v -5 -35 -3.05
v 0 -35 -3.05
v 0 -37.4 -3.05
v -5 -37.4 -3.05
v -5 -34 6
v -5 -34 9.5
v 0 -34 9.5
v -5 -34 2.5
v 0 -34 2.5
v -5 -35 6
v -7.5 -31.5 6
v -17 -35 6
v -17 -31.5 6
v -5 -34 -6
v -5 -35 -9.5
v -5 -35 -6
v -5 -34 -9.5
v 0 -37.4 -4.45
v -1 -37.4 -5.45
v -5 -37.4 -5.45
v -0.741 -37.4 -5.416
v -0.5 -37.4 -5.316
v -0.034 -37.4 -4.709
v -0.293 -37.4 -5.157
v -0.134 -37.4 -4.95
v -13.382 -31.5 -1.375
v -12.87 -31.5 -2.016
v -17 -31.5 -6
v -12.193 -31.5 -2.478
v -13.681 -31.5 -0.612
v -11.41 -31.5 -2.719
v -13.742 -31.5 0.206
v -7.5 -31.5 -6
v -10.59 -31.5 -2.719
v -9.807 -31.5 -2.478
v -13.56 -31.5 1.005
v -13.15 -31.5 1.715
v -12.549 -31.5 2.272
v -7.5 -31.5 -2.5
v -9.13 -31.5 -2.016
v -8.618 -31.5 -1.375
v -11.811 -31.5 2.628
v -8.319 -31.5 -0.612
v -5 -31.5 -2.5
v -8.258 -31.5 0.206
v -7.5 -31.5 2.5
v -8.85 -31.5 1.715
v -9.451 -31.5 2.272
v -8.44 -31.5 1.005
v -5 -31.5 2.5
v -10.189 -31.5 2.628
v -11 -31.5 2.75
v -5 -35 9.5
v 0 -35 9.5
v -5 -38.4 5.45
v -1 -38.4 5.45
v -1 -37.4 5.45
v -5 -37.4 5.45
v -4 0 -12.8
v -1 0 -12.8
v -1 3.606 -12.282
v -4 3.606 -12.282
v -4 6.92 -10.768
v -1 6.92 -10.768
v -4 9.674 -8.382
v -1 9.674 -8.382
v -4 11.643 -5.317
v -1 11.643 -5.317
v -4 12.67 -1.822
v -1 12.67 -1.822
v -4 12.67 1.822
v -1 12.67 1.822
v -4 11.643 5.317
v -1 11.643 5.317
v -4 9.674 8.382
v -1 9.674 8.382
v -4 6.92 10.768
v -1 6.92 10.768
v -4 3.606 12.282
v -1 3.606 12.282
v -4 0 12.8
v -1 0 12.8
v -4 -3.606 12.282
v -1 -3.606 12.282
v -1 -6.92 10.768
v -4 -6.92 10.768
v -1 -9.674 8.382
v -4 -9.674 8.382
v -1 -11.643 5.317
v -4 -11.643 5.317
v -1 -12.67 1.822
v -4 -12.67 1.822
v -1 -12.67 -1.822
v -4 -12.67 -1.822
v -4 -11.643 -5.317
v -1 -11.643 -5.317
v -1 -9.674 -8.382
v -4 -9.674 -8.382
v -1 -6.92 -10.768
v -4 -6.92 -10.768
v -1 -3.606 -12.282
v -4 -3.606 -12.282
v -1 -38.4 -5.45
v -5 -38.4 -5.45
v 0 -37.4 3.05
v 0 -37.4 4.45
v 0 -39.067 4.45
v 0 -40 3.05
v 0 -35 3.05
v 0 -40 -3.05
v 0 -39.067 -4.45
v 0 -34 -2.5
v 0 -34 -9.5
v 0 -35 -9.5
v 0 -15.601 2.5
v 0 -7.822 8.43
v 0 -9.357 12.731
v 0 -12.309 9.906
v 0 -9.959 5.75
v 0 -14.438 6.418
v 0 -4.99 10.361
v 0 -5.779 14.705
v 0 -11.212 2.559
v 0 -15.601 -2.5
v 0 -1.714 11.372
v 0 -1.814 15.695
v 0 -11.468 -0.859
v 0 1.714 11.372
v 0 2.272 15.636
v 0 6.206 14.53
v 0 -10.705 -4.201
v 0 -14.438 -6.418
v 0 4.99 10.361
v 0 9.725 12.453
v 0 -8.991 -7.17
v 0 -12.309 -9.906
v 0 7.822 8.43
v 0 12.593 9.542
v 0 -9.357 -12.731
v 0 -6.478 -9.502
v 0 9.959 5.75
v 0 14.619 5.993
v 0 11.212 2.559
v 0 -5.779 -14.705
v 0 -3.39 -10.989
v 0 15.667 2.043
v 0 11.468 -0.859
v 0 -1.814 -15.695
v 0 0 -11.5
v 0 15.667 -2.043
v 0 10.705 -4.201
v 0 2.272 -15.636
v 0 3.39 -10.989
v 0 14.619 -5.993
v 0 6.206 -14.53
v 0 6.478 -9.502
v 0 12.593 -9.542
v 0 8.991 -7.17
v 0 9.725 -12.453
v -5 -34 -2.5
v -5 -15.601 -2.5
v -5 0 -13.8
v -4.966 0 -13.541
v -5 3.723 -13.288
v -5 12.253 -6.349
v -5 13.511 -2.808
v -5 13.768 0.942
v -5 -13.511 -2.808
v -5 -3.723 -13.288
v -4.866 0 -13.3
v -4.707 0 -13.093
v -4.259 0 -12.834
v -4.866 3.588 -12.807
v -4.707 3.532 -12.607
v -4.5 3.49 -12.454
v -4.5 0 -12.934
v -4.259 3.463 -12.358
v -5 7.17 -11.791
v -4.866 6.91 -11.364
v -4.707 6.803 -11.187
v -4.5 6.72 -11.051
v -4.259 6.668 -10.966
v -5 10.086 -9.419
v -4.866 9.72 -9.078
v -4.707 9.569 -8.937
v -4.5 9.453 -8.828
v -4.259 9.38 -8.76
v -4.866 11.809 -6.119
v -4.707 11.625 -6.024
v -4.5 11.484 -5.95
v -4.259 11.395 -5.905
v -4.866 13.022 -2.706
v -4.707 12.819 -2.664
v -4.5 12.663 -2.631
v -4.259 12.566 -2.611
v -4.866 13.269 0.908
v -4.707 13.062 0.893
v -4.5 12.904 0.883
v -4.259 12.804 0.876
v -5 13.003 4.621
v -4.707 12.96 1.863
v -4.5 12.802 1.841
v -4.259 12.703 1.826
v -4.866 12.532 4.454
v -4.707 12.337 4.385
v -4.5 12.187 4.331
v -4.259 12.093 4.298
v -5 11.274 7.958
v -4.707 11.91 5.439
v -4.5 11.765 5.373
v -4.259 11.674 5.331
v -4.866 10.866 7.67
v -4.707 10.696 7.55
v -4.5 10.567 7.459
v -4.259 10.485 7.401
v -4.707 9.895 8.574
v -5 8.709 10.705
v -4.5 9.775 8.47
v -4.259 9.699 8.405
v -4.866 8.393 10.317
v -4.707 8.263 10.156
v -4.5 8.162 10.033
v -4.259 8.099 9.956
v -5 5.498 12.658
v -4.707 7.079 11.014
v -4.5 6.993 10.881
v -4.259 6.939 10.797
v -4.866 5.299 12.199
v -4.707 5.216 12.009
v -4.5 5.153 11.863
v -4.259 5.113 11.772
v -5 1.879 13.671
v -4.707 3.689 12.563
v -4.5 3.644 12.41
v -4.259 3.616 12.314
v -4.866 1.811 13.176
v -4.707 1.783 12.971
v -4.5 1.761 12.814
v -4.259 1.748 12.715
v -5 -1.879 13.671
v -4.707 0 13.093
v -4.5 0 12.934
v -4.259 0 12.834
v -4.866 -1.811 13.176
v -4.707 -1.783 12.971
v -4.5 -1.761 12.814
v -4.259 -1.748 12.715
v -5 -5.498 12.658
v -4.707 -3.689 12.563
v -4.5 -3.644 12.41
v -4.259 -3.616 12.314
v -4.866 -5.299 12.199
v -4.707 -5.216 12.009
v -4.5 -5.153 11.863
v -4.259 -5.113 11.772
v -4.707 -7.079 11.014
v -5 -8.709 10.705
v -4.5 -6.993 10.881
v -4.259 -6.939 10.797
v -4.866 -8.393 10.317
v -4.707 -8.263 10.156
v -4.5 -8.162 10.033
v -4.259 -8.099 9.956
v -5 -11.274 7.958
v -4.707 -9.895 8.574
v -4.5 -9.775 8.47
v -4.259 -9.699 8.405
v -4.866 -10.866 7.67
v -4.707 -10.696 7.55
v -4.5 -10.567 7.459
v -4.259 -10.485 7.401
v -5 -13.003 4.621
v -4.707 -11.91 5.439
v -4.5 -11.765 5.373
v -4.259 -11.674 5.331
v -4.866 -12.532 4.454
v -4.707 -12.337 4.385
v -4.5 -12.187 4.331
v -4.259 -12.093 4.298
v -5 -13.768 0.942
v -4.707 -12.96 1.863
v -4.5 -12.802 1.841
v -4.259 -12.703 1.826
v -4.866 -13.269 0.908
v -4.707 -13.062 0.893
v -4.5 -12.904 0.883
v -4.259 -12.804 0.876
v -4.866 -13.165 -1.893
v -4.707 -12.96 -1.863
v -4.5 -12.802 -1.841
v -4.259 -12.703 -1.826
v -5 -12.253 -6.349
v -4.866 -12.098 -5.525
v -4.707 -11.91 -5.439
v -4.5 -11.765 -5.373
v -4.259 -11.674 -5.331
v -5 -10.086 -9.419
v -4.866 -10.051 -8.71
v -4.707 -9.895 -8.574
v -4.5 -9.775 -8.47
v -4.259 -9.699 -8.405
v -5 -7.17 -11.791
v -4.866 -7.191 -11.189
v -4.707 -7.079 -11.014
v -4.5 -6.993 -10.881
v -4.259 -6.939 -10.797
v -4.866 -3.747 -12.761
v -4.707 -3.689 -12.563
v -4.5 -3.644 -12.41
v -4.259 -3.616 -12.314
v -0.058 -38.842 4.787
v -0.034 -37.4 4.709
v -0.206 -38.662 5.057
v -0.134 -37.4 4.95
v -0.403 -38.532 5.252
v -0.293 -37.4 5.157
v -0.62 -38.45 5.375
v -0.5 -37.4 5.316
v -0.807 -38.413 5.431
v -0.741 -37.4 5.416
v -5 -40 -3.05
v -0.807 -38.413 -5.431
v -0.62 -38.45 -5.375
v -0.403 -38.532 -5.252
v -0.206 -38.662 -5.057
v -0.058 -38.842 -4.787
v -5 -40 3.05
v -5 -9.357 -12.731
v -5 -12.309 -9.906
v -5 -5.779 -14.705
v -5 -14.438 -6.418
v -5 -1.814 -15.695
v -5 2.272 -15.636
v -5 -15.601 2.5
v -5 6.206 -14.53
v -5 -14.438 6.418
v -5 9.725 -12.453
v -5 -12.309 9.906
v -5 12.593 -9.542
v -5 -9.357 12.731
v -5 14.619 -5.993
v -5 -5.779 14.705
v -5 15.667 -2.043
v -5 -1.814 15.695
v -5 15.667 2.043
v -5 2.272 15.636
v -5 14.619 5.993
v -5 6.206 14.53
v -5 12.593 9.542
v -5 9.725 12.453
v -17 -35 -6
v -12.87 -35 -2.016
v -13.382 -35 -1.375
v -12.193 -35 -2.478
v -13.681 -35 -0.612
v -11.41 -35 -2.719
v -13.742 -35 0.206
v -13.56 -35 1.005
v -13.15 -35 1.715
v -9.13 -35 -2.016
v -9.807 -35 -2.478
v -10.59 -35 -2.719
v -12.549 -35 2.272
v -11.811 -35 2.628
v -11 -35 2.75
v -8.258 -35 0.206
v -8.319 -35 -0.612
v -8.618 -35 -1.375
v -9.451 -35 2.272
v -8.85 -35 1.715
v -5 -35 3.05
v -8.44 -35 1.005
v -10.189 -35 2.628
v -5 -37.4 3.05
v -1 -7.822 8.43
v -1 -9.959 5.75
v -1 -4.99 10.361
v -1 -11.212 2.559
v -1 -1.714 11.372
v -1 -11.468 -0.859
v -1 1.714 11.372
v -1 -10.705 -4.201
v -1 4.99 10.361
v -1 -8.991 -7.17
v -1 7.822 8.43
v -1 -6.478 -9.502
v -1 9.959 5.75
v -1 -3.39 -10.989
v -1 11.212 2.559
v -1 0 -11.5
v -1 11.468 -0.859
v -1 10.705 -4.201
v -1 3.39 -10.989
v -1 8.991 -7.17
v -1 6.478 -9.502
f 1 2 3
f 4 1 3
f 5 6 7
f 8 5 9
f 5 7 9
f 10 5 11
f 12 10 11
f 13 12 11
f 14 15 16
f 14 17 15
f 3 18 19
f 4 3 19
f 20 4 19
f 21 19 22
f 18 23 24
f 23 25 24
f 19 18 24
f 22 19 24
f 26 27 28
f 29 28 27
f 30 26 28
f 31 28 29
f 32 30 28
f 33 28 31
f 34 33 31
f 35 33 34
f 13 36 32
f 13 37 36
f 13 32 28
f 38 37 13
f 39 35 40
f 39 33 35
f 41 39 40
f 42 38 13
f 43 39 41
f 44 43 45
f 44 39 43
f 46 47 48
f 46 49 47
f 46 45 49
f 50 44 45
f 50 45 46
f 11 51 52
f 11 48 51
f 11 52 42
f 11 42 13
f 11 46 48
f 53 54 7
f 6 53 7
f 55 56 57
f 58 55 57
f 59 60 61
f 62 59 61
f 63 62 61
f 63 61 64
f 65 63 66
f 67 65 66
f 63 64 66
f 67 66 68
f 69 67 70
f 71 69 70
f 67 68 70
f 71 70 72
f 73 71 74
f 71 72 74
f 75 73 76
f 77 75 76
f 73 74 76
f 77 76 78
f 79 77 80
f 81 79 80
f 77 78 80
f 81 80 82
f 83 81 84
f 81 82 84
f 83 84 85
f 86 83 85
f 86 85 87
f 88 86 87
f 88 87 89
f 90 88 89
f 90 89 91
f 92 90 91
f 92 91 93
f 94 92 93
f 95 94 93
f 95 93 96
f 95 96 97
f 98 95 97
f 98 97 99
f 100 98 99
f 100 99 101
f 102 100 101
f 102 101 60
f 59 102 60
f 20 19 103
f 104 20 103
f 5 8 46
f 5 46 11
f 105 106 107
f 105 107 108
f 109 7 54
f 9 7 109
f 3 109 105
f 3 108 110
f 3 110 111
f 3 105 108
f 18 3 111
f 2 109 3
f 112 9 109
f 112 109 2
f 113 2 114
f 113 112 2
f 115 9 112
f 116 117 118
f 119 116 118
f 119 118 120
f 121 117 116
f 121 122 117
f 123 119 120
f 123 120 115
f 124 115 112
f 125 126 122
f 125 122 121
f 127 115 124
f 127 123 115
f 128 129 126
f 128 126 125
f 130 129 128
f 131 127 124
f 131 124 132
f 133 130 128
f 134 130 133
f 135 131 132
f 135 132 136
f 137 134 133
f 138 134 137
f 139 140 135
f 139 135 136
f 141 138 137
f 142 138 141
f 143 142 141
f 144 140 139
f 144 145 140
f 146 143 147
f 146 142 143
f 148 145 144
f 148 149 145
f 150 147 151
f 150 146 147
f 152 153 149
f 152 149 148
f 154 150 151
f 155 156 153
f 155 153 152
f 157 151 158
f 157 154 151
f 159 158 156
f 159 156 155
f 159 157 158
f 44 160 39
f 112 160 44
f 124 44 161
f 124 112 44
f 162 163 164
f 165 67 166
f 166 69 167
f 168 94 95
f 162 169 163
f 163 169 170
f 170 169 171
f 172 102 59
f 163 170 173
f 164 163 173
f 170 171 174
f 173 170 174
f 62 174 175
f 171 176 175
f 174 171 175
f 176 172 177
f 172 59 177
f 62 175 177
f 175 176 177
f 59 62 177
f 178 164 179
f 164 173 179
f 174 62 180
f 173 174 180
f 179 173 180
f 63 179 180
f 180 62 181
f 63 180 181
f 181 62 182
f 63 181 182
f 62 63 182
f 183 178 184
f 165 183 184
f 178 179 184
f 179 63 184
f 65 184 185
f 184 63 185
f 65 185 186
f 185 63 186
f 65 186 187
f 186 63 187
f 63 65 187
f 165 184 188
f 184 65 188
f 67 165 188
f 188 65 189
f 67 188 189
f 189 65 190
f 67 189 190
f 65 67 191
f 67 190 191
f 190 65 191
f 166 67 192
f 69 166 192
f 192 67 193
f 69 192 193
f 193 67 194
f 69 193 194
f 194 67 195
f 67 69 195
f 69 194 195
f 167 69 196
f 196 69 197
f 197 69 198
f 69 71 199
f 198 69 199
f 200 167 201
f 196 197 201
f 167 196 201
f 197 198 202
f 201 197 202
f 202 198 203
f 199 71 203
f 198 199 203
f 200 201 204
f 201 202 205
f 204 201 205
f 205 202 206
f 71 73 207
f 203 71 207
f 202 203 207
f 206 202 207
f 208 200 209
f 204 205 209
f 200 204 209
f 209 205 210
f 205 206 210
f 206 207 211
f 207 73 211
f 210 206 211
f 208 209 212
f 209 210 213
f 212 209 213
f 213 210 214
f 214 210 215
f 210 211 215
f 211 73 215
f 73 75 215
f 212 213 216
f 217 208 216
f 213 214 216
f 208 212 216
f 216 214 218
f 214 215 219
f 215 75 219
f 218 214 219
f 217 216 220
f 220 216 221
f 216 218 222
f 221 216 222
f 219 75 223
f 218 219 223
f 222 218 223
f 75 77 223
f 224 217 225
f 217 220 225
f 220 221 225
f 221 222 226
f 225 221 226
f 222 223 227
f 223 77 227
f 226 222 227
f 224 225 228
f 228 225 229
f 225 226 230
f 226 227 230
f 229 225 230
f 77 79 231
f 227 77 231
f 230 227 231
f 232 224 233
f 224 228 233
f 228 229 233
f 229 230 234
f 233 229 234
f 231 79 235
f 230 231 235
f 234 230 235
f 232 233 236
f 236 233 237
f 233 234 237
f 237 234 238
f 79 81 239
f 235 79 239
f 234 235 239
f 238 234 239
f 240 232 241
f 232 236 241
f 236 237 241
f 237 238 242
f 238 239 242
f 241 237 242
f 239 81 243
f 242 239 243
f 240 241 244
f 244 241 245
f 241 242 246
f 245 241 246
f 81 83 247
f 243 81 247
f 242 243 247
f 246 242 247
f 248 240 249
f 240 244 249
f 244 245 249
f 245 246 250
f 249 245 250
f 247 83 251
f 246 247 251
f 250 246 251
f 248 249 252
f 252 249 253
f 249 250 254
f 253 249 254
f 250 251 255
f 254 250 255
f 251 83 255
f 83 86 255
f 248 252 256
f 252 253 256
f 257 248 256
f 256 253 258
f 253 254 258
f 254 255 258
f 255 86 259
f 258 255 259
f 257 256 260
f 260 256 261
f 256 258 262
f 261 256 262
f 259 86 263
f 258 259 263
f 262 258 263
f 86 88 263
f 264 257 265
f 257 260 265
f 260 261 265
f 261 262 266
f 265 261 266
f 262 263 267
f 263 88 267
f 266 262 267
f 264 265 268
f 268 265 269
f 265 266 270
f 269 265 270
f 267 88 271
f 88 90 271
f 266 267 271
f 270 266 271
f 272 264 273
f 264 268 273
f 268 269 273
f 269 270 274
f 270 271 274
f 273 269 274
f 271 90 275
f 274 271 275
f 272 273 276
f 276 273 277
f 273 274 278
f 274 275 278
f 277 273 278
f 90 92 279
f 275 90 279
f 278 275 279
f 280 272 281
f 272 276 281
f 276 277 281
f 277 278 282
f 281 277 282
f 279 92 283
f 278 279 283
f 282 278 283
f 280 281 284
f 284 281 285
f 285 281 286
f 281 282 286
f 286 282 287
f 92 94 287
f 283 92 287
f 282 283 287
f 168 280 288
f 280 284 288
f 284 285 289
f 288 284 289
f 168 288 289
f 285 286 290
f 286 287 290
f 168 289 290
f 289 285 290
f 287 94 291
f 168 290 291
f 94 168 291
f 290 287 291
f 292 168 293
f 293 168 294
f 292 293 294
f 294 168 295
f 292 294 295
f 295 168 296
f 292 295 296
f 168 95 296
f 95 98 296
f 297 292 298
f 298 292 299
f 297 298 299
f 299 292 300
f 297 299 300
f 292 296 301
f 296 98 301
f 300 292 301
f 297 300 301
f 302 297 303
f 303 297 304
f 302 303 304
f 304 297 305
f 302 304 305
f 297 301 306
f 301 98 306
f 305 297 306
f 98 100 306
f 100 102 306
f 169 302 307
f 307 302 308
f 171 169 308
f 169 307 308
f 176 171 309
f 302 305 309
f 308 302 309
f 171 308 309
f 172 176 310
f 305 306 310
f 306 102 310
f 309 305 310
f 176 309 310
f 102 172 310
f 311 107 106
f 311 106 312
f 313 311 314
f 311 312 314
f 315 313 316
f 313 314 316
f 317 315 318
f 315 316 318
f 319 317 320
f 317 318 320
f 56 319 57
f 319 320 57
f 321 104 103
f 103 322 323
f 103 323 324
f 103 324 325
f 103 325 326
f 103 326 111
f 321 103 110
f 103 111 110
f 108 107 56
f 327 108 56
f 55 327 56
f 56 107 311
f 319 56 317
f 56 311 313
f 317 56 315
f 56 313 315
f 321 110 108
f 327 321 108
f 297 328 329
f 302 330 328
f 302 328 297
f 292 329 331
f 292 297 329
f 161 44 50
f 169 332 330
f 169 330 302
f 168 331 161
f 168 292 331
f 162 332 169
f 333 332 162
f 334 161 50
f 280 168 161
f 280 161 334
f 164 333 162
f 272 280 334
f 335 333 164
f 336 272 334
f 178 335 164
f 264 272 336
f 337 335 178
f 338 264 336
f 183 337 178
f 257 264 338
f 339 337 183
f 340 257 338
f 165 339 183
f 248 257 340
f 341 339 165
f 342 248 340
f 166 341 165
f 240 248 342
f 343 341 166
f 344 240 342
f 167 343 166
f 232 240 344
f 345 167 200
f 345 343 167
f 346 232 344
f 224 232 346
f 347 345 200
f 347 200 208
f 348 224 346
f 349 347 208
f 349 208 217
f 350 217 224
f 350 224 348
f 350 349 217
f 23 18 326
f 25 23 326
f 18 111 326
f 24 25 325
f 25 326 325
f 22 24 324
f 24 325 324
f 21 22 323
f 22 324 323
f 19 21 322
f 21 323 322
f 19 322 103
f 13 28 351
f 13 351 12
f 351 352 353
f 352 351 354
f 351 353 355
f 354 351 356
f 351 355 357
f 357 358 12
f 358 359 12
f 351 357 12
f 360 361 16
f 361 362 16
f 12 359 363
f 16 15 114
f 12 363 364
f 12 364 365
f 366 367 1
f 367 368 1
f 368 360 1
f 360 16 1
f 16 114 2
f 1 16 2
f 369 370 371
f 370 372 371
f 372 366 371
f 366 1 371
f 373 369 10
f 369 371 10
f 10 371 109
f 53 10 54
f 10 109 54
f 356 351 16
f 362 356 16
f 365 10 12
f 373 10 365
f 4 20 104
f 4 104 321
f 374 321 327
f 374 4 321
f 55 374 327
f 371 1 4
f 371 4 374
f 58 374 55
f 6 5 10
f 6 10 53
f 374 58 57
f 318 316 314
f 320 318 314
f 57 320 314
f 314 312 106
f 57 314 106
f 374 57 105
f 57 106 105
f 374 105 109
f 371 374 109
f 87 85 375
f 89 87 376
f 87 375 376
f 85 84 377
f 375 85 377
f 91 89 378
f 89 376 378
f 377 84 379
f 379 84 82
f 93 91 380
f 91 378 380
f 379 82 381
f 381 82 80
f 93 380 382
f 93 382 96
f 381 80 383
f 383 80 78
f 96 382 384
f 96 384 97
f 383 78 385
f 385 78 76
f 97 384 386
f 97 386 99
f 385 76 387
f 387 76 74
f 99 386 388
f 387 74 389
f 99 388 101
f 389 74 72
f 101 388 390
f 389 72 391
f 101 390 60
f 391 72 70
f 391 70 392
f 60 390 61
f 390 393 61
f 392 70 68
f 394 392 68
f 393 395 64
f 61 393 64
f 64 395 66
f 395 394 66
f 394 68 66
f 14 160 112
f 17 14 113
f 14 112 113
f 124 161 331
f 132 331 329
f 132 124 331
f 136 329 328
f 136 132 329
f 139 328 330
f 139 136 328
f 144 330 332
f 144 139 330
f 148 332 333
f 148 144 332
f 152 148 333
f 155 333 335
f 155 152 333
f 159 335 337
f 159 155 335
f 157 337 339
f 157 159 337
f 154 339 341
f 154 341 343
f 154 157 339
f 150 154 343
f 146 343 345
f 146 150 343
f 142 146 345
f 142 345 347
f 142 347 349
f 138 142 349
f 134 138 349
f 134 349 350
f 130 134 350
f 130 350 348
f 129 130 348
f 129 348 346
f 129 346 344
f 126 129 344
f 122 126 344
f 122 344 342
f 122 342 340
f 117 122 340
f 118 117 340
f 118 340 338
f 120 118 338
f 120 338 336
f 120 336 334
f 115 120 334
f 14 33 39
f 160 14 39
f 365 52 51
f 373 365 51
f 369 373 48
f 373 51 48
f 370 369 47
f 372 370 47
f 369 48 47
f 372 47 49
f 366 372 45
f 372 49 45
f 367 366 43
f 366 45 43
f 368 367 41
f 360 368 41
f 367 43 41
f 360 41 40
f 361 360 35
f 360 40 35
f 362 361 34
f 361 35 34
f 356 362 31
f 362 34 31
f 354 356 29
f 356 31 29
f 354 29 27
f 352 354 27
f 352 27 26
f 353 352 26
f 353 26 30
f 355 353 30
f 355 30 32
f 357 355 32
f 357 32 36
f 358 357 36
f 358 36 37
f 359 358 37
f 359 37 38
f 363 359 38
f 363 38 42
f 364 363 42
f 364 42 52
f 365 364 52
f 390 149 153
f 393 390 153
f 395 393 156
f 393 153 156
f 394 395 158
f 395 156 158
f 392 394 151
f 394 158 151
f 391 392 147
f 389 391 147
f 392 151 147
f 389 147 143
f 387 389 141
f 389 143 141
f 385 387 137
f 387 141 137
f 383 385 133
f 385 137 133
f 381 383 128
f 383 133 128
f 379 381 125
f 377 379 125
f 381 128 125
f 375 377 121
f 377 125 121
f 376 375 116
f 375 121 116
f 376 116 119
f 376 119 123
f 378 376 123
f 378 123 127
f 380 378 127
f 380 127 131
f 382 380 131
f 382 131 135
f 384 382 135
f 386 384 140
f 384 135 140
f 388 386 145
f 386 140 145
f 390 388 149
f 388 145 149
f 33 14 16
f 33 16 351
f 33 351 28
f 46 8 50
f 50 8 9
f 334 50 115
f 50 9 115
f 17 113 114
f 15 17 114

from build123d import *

# Parameters (mm, degrees)
SKETCH1_R            = 15.8
SKETCH1_R_2          = 12.8
BOSS_EXTRUDE1_DEPTH  = 5
SKETCH2_W            = 5
SKETCH2_H            = 19.399038491
BOSS_EXTRUDE2_DEPTH  = 5
BOSS_EXTRUDE3_DEPTH  = 5
FILLET1_R            = 1
SKETCH38_W           = 12
SKETCH38_H           = 3.5
BOSS_EXTRUDE28_DEPTH = 12
CUT_EXTRUDE3_REACH   = 54.687
SKETCH39_R           = 2.75
CHAMFER1_SIZE        = 2.5
FILLET3_R            = 1
SKETCH1_3_R          = 12.8
SKETCH1_3_R_2        = 11.5
BOSS_EXTRUDE29_DEPTH = 1


with BuildPart() as part:
    # Sketch1 → Boss-Extrude1 (new body)
    with BuildSketch(Plane(origin=(0, 0, 0), x_dir=(0, 0, -1), z_dir=(1, 0, 0))):
        Circle(SKETCH1_R)
        Circle(SKETCH1_R_2, mode=Mode.SUBTRACT)
    extrude(amount=-BOSS_EXTRUDE1_DEPTH)

    # Sketch2 → Boss-Extrude2 (add)
    with BuildSketch(Plane(origin=(0, 0, 0), x_dir=(0, 0, -1), z_dir=(1, 0, 0))):
        with Locations((0, -25.300480755)):
            Rectangle(SKETCH2_W, SKETCH2_H)
    extrude(amount=-BOSS_EXTRUDE2_DEPTH)

    # Sketch3 → Boss-Extrude3 (add)
    with BuildSketch(Plane(origin=(0, 0, 0), x_dir=(0, 0, -1), z_dir=(1, 0, 0))):
        Polygon((-9.5, -35), (-9.5, -34), (9.5, -34), (9.5, -35), (3.05, -35), (3.05, -37.4), (5.45, -37.4), (5.45, -38.4), (3.05, -40), (-3.05, -40), (-5.45, -38.4), (-5.45, -37.4), (-3.05, -37.4), (-3.05, -35), align=None)
    extrude(amount=-BOSS_EXTRUDE3_DEPTH)

    # Fillet1
    fillet1_edges = [part.edges().sort_by_distance(p)[0] for p in [
        (0, -37.9, 5.45),
        (0, -37.9, -5.45),
    ]]
    fillet(fillet1_edges, radius=FILLET1_R)

    # Sketch38 → Boss-Extrude28 (add)
    with BuildSketch(Plane.ZY.offset(5)):
        with Locations((0, -33.25)):
            Rectangle(SKETCH38_W, SKETCH38_H)
    extrude(amount=BOSS_EXTRUDE28_DEPTH)

    # Sketch39 → Cut-Extrude3 (cut, up to next)
    with BuildSketch(Plane(origin=(0, -31.5, 0), x_dir=(1, 0, 0), z_dir=(0, 1, 0)), mode=Mode.PRIVATE) as cut_extrude3_sk1:
        with Locations(Location((-11, 0, 0), (0, 0, 270))):
            Circle(SKETCH39_R)
    cut_extrude3_tool1 = extrude(cut_extrude3_sk1.sketch, amount=-CUT_EXTRUDE3_REACH, mode=Mode.PRIVATE) & part.part
    add(cut_extrude3_tool1.solids().sort_by_distance((-11, -31.5, 0))[0], mode=Mode.SUBTRACT)

    # Chamfer1
    chamfer1_edges = [part.edges().sort_by_distance(p)[0] for p in [
        (-5, -31.5, 4.25),
        (-5, -31.5, -4.25),
    ]]
    chamfer(chamfer1_edges, length=CHAMFER1_SIZE - 0.0001)  # a hair under: the kernel refuses the full size

    # Fillet3
    fillet3_edges = [part.edges().sort_by_distance(p)[0] for p in [
        (-5, 0, 12.8),
    ]]
    fillet(fillet3_edges, radius=FILLET3_R)

    # Sketch1<3> → Boss-Extrude29 (add)
    with BuildSketch(Plane(origin=(0, 0, 0), x_dir=(0, 0, -1), z_dir=(1, 0, 0))):
        Circle(SKETCH1_3_R)
        Circle(SKETCH1_3_R_2, mode=Mode.SUBTRACT)
    extrude(amount=-BOSS_EXTRUDE29_DEPTH)


solid = part.part
